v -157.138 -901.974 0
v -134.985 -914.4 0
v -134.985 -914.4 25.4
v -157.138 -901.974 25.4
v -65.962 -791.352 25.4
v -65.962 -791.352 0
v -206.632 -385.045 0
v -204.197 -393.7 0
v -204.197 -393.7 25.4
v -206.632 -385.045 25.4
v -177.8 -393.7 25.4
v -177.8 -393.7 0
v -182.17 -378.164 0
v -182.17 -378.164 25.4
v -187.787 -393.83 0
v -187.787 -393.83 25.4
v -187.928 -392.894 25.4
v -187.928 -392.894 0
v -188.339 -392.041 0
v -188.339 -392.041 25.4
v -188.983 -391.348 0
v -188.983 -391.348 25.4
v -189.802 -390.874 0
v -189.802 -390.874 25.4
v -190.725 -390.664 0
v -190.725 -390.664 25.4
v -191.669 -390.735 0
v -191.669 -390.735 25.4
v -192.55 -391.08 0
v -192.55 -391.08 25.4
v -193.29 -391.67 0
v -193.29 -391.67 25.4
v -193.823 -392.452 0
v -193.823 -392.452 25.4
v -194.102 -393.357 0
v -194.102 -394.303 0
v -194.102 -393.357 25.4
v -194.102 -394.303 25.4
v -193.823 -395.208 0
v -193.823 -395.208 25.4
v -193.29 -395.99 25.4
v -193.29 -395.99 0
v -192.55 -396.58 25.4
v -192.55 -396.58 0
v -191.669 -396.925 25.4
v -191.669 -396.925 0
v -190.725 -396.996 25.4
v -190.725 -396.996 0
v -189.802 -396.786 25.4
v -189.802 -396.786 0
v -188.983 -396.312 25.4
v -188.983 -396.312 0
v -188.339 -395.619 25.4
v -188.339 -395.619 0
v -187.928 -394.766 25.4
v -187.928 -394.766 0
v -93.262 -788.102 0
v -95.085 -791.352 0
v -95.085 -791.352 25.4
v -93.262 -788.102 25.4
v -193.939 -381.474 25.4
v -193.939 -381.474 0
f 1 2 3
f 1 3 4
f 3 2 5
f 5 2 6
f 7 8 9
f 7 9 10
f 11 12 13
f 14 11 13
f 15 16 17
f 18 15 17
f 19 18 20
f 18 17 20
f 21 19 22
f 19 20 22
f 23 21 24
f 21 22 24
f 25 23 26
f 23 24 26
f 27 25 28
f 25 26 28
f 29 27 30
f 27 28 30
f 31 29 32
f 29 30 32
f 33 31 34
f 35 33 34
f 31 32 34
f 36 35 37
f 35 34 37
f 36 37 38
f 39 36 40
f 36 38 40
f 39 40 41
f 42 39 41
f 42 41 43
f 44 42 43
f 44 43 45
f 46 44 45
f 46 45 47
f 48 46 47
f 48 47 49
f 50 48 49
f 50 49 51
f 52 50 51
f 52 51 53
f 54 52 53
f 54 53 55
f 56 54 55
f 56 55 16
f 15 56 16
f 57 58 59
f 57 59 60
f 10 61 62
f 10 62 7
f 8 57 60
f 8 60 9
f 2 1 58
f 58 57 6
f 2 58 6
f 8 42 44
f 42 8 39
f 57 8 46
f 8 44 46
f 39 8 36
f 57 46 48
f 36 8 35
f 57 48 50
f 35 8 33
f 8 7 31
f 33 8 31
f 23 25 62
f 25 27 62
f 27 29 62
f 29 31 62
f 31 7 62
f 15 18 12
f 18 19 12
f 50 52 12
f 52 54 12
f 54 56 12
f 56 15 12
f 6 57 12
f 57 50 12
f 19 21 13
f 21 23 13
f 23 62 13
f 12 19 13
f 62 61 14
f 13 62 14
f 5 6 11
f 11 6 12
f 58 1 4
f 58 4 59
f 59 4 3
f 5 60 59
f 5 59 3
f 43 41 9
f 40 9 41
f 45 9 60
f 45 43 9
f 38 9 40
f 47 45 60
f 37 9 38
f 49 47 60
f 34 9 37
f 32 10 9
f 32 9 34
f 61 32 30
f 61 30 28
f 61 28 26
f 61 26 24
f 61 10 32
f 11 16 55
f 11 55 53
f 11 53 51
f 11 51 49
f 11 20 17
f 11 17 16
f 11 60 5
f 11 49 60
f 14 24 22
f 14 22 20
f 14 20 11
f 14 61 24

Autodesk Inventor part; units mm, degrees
ref_plane "YZ Plane" through (0, 0, 0) normal (1, 0, 0) x (0, 1, 0)
ref_plane "XZ Plane" through (0, 0, 0) normal (0, 1, 0) x (-1, 0, 0)
ref_plane "XY Plane" through (0, 0, 0) normal (0, 0, 1) x (1, 0, 0)
ref_plane "Work Plane1" through (-0.0049, -0.13, 0) normal (0, 0, 1) x (1, 0, 0)
sketch "Sketch1" plane through (-0.0049, -0.13, 0) normal (0, 0, 1) x (1, 0, 0)
  line L0 (0.0049, 0.13) -> (-63.4951, 0.13)
  line L1 (-63.4951, 0.13) -> (-63.4951, -482.47)
  line L2 (-63.4951, -482.47) -> (0.0049, -482.47)
  line L3 (0.0049, -482.47) -> (0.0049, 0.13)
  line L4 (-63.4951, -482.47) -> (114.3049, -482.47)
  line L5 (-63.4951, -482.47) -> (114.3049, -482.47) construction
  line L6 (-63.4951, -482.47) -> (63.5049, -482.47)
  line L7 (63.5049, -482.47) -> (63.5049, -406.27)
  line L8 (63.5049, -406.27) -> (-63.4951, -406.27)
  line L9 (-63.4951, -406.27) -> (-63.4951, -482.47)
  line L10 (-63.4951, -482.47) -> (-63.4951, -914.27)
  line L11 (-63.4951, -482.47) -> (368.3049, -482.47) construction
  line L12 (-63.4951, -914.27) -> (114.3049, -914.27)
  line L13 (114.3049, -914.27) -> (114.3049, -482.47)
  line L14 (-63.4951, -406.27) -> (-63.4951, -393.57)
  line L15 (-63.4951, -406.27) -> (-50.7951, -406.27) construction
  line L16 (-63.4951, -393.57) -> (-317.4951, -393.57)
  line L17 (-63.4951, -393.57) -> (190.5049, -393.57) construction
  line L18 (-63.4951, -393.57) -> (-317.4951, -393.57)
  line L19 (-317.4951, -393.57) -> (-317.4951, -914.27)
  line L20 (-317.4951, -914.27) -> (-63.4951, -914.27)
  line L21 (-63.4951, -914.27) -> (-63.4951, -393.57)
  line L22 (-63.4951, -393.57) -> (-177.7951, -393.57)
  line L23 (-177.7951, -393.57) -> (114.3049, -685.67)
  line L24 (114.3049, -685.67) -> (114.3049, -914.27)
  line L25 (-177.7951, -393.57) -> (114.3049, -685.6537)
  line L26 (-177.7951, -393.57) -> (-177.7951, -990.597)
  line L27 (-177.7951, -393.57) -> (419.2319, -393.57) construction
  line L28 (-177.7951, -990.597) -> (-65.9571, -791.2225)
  line L29 (-177.7951, -990.597) -> (50.8049, -990.597) construction
  line L30 (-65.9571, -791.2225) -> (-177.7951, -393.57)
  line L31 (-134.9799, -914.27) -> (-157.1327, -901.8436)
  line L32 (-134.9799, -914.27) -> (-109.5799, -914.27) construction
  line L33 (-157.1327, -901.8436) -> (-95.0804, -791.2225)
  line L34 (-75.3464, -757.8376) -> (-99.7978, -764.7145)
  line L35 (-95.0804, -791.2225) -> (-93.2568, -787.9716)
  line L36 (-93.2568, -787.9716) -> (-204.1924, -393.57)
  line L37 (-93.2568, -787.9716) -> (316.4496, -787.9716) construction
  line L38 (-190.4951, -393.57) -> (-193.9339, -381.3444)
  line L39 (-190.4951, -393.57) -> (-177.7951, -393.57) construction
  line L40 (-204.1924, -393.57) -> (-207.1501, -383.0548)
  line L41 (-193.9339, -381.3444) -> (-206.6269, -384.9147)
  line L42 (-206.6269, -384.9147) -> (-176.4218, -376.4187)
  line L43 (-177.7951, -393.57) -> (-182.165, -378.0341)
  line L44 (-182.165, -378.0341) -> (-206.6269, -384.9147)
  line L45 (-206.6269, -384.9147) -> (-93.2568, -787.9716)
  line L46 (-190.4951, -393.57) -> (-177.7951, -393.57)
  line L47 (-177.7951, -393.57) -> (-182.165, -378.0341)
  line L48 (-182.165, -378.0341) -> (-193.9339, -381.3444)
  line L49 (-193.9339, -381.3444) -> (-190.4951, -393.57)
  dimension "d0" = 63.5
  dimension "d1" = 482.6
  dimension "d2" = 177.8
  dimension "d3" = 0
  dimension "d4" = 127
  dimension "d5" = 76.2
  dimension "d6" = 431.8
  dimension "d7" = 90
  dimension "d8" = 12.7
  dimension "d9" = 90
  dimension "d10" = 254
  dimension "d11" = 180
  dimension "d12" = 254
  dimension "d13" = 520.7
  dimension "d14" = 114.3
  dimension "d15" = 45
  dimension "d16" = 413.0802
  dimension "d17" = 597.027
  dimension "d18" = 90
  dimension "d19" = 228.6
  dimension "d20" = 60.71
  dimension "d21" = 25.4
  dimension "d22" = 150.71
  dimension "d23" = 25.4
  dimension "d25" = 105.71
  dimension "d26" = 12.7
  dimension "d27" = 105.71
extrude "Extrusion1" add sketch "Sketch1" along normal blind 25.4 contours L26 L36 L16 | L30 L34 L36 L26 | L16 L38 L42 L43 | L16 L40 L41 L38 | L30 L28 L31 L33 L35 L36 L34
sketch "Sketch2" plane through (-0.0049, -0.13, 25.4) normal (0, 0, 1) x (1, 0, 0)
  line L0 (-182.165, -378.0341) -> (-206.6269, -384.9147) projected
  line L1 (-206.6269, -384.9147) -> (-182.165, -378.0341)
  line L2 (-182.165, -378.0341) -> (-194.396, -381.4744)
  line L3 (-194.396, -381.4744) -> (-190.9572, -393.7)
  circle A0 centre (-190.9572, -393.7) radius 3.175
  point P0 (0.0049, 0.13)
  dimension "d30" = 12.7
  dimension "d31" = 6.35
extrude "Extrusion2" cut sketch "Sketch2" against normal blind 25.4
properties part number "V-Arm"
